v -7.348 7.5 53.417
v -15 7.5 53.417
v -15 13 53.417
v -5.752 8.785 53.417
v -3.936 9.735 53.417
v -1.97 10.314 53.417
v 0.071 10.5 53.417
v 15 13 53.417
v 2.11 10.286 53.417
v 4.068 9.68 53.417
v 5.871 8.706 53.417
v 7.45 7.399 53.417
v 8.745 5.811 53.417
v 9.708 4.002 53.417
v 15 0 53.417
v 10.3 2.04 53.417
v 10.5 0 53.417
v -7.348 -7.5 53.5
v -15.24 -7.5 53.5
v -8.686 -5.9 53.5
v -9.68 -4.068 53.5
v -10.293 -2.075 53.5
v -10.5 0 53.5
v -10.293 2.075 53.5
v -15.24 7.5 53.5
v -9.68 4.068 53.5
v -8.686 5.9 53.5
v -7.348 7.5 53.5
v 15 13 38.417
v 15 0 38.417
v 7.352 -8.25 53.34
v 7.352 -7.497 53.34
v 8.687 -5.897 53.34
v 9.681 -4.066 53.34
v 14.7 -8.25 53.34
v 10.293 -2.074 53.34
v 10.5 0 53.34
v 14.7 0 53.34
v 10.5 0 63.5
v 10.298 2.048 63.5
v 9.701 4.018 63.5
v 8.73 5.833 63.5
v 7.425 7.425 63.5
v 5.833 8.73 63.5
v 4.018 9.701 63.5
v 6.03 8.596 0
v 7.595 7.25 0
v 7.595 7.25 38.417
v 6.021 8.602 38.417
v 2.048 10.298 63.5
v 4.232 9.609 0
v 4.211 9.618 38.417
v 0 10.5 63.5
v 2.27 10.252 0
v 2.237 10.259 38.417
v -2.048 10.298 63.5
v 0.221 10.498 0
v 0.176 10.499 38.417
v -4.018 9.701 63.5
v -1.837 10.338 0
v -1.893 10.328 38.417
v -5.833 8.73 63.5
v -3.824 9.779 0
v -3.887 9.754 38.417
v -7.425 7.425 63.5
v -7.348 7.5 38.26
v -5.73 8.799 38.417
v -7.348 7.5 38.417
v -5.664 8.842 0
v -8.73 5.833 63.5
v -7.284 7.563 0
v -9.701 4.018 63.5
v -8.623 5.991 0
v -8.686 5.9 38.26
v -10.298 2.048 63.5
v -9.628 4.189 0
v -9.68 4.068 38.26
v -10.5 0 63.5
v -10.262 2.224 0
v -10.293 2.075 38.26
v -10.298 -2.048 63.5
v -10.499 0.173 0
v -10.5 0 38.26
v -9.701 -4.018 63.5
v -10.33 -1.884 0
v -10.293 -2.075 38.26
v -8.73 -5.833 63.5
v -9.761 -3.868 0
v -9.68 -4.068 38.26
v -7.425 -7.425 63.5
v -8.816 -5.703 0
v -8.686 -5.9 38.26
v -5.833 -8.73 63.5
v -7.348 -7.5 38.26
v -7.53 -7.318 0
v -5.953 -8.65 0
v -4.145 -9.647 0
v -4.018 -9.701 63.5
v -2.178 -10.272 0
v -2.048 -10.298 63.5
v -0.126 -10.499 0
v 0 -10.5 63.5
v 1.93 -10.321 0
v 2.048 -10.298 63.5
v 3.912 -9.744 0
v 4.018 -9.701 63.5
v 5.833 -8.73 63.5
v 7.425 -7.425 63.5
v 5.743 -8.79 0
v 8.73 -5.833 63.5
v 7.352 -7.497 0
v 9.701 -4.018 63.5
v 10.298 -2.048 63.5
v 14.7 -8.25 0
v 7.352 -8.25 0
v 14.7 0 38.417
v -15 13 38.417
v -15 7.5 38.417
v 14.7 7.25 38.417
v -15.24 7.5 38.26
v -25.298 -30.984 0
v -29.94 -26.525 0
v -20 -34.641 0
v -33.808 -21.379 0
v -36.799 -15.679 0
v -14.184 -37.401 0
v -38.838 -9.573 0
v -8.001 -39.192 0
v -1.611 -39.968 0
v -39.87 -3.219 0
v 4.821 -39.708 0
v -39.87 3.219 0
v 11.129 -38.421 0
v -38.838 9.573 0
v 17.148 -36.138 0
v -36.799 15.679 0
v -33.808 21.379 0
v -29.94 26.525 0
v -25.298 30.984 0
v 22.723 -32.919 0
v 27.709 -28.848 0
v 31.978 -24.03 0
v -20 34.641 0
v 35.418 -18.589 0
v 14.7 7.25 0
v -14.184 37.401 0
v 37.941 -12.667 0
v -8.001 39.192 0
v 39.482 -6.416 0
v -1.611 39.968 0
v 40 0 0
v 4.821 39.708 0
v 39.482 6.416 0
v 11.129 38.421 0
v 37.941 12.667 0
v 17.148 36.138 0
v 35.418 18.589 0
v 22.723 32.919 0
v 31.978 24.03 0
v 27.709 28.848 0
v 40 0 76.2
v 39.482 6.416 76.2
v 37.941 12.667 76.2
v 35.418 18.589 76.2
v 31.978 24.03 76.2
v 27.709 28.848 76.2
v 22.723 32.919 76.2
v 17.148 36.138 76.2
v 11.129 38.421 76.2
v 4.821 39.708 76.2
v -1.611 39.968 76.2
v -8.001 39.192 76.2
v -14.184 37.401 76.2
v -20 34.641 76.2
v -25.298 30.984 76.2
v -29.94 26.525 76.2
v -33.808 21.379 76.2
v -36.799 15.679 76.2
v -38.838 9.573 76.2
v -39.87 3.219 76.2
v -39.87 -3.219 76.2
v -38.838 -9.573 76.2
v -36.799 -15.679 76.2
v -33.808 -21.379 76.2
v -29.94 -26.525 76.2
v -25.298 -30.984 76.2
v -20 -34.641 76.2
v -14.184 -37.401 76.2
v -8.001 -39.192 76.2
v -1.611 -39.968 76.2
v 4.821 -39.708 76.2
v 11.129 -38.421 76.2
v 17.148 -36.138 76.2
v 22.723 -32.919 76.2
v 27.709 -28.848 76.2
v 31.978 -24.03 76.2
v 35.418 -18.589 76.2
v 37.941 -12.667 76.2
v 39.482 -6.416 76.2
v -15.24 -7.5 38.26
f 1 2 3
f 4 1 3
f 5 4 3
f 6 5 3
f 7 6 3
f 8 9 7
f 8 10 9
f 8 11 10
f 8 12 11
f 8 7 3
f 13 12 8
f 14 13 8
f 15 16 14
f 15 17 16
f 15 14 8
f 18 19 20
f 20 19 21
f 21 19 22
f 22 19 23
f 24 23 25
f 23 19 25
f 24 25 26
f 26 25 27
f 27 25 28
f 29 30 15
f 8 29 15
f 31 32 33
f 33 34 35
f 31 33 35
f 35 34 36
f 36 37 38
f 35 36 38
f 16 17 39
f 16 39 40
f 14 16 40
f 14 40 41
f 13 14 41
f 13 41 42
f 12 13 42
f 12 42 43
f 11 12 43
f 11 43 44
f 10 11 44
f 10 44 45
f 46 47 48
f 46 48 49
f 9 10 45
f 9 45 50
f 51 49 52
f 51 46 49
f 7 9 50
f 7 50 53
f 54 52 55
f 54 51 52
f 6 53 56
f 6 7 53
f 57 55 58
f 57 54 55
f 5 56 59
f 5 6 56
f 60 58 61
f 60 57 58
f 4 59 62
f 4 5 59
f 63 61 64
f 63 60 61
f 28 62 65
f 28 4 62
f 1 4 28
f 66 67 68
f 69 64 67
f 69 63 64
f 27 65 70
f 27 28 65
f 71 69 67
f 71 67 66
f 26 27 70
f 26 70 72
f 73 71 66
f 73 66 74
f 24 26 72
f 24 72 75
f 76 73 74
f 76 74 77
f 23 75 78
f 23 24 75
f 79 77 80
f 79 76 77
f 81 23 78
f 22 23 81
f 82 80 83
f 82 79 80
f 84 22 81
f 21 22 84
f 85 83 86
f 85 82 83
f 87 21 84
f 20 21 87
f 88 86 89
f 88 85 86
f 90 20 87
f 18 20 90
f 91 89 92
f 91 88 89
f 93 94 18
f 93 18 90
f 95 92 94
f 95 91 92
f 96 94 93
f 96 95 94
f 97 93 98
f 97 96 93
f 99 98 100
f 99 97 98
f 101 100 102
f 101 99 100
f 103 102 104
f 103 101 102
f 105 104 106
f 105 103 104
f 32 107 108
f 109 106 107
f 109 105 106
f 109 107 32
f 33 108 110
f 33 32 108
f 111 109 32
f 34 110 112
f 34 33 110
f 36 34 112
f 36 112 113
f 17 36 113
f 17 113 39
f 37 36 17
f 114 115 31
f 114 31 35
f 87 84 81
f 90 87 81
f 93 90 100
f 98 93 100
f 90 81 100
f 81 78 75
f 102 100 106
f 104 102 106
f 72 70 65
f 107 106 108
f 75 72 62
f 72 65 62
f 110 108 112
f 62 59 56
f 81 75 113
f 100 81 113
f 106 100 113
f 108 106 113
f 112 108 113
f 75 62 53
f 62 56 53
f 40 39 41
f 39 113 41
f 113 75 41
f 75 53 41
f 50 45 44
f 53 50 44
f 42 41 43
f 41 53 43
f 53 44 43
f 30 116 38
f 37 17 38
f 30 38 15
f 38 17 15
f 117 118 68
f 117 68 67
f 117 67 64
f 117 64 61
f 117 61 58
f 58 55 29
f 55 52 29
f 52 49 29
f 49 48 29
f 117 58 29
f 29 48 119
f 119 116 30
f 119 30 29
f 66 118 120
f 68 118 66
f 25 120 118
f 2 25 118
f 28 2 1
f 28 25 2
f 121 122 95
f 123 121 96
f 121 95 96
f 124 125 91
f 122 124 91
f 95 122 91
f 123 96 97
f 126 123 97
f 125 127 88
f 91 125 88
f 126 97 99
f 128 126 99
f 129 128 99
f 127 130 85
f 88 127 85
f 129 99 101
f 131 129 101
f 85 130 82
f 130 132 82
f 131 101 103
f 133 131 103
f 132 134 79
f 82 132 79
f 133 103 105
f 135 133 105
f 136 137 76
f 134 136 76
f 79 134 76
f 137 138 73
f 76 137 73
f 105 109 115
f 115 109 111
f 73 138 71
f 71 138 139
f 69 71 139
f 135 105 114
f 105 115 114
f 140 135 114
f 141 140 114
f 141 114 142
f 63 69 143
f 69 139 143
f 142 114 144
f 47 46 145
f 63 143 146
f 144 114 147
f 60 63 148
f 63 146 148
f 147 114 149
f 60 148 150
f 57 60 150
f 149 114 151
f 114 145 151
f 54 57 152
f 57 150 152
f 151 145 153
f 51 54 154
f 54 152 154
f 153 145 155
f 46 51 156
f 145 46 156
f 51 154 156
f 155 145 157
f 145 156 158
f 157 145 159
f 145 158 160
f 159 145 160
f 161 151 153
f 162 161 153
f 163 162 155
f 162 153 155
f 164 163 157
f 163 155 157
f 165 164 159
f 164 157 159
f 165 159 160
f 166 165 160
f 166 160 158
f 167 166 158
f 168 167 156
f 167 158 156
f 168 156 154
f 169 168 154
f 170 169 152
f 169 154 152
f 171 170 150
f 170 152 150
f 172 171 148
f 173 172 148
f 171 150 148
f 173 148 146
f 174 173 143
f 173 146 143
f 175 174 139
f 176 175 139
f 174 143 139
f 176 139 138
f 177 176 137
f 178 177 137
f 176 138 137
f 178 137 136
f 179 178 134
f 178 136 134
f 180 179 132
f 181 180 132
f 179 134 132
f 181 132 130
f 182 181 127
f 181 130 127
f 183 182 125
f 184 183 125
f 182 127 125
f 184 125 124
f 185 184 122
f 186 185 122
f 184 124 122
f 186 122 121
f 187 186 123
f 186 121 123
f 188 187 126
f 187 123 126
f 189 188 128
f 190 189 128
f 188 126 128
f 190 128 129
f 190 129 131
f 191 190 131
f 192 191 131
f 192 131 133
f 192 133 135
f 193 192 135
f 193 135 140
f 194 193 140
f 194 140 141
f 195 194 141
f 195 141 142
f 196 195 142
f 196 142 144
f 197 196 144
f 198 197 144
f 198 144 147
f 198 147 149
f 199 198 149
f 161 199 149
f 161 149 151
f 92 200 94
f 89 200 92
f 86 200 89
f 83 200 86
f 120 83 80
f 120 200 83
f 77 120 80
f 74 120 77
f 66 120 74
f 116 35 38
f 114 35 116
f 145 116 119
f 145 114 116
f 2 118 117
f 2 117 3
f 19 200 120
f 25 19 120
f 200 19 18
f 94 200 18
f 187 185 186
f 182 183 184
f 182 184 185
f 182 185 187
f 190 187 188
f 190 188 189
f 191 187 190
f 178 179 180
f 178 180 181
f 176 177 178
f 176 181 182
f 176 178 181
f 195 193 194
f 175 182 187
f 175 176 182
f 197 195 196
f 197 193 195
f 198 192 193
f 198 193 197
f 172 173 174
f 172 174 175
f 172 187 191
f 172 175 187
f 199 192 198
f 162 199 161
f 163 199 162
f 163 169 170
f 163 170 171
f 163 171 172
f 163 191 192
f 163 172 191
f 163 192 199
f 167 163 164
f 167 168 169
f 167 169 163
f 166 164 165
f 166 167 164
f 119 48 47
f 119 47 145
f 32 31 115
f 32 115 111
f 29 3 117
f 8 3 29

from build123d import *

# Parameters (mm, degrees)
F0_R      = 40
F1_DEPTH  = 76.2
F2_R      = 10.5
F3_DEPTH  = 63.5
F4_W      = 7.348393
F4_H      = 15.5
F5_DEPTH  = 53.34
F7_W      = 15.24
F7_H      = 15
F8_DEPTH  = 15.24
F9_W      = 30
F9_H      = 15
F10_DEPTH = 13


with BuildPart() as f1:
    # F0 (on Top) → F1 (new body)
    with BuildSketch(Plane.XY):
        Circle(F0_R)
    extrude(amount=F1_DEPTH)

    # F2 (on Top) → F3 (cut)
    with BuildSketch(Plane.XY):
        Circle(F2_R)
    extrude(amount=F3_DEPTH, mode=Mode.SUBTRACT)

    # F4 (on Top) → F5 (cut)
    with BuildSketch(Plane.XY):
        with Locations((11.025803, -0.5)):
            Rectangle(F4_W, F4_H)
    extrude(amount=F5_DEPTH, mode=Mode.SUBTRACT)

    # F7 (on offset) → F8 (cut)
    with BuildSketch(Plane.XY.offset(53.5)):
        with Locations((-7.62, 0)):
            Rectangle(F7_W, F7_H)
    extrude(amount=-F8_DEPTH, mode=Mode.SUBTRACT)

    # F9 (on Front) → F10 (cut)
    with BuildSketch(Plane.XZ):
        with Locations((0, 45.916821)):
            Rectangle(F9_W, F9_H)
    extrude(amount=-F10_DEPTH, mode=Mode.SUBTRACT)


solid = f1.part
